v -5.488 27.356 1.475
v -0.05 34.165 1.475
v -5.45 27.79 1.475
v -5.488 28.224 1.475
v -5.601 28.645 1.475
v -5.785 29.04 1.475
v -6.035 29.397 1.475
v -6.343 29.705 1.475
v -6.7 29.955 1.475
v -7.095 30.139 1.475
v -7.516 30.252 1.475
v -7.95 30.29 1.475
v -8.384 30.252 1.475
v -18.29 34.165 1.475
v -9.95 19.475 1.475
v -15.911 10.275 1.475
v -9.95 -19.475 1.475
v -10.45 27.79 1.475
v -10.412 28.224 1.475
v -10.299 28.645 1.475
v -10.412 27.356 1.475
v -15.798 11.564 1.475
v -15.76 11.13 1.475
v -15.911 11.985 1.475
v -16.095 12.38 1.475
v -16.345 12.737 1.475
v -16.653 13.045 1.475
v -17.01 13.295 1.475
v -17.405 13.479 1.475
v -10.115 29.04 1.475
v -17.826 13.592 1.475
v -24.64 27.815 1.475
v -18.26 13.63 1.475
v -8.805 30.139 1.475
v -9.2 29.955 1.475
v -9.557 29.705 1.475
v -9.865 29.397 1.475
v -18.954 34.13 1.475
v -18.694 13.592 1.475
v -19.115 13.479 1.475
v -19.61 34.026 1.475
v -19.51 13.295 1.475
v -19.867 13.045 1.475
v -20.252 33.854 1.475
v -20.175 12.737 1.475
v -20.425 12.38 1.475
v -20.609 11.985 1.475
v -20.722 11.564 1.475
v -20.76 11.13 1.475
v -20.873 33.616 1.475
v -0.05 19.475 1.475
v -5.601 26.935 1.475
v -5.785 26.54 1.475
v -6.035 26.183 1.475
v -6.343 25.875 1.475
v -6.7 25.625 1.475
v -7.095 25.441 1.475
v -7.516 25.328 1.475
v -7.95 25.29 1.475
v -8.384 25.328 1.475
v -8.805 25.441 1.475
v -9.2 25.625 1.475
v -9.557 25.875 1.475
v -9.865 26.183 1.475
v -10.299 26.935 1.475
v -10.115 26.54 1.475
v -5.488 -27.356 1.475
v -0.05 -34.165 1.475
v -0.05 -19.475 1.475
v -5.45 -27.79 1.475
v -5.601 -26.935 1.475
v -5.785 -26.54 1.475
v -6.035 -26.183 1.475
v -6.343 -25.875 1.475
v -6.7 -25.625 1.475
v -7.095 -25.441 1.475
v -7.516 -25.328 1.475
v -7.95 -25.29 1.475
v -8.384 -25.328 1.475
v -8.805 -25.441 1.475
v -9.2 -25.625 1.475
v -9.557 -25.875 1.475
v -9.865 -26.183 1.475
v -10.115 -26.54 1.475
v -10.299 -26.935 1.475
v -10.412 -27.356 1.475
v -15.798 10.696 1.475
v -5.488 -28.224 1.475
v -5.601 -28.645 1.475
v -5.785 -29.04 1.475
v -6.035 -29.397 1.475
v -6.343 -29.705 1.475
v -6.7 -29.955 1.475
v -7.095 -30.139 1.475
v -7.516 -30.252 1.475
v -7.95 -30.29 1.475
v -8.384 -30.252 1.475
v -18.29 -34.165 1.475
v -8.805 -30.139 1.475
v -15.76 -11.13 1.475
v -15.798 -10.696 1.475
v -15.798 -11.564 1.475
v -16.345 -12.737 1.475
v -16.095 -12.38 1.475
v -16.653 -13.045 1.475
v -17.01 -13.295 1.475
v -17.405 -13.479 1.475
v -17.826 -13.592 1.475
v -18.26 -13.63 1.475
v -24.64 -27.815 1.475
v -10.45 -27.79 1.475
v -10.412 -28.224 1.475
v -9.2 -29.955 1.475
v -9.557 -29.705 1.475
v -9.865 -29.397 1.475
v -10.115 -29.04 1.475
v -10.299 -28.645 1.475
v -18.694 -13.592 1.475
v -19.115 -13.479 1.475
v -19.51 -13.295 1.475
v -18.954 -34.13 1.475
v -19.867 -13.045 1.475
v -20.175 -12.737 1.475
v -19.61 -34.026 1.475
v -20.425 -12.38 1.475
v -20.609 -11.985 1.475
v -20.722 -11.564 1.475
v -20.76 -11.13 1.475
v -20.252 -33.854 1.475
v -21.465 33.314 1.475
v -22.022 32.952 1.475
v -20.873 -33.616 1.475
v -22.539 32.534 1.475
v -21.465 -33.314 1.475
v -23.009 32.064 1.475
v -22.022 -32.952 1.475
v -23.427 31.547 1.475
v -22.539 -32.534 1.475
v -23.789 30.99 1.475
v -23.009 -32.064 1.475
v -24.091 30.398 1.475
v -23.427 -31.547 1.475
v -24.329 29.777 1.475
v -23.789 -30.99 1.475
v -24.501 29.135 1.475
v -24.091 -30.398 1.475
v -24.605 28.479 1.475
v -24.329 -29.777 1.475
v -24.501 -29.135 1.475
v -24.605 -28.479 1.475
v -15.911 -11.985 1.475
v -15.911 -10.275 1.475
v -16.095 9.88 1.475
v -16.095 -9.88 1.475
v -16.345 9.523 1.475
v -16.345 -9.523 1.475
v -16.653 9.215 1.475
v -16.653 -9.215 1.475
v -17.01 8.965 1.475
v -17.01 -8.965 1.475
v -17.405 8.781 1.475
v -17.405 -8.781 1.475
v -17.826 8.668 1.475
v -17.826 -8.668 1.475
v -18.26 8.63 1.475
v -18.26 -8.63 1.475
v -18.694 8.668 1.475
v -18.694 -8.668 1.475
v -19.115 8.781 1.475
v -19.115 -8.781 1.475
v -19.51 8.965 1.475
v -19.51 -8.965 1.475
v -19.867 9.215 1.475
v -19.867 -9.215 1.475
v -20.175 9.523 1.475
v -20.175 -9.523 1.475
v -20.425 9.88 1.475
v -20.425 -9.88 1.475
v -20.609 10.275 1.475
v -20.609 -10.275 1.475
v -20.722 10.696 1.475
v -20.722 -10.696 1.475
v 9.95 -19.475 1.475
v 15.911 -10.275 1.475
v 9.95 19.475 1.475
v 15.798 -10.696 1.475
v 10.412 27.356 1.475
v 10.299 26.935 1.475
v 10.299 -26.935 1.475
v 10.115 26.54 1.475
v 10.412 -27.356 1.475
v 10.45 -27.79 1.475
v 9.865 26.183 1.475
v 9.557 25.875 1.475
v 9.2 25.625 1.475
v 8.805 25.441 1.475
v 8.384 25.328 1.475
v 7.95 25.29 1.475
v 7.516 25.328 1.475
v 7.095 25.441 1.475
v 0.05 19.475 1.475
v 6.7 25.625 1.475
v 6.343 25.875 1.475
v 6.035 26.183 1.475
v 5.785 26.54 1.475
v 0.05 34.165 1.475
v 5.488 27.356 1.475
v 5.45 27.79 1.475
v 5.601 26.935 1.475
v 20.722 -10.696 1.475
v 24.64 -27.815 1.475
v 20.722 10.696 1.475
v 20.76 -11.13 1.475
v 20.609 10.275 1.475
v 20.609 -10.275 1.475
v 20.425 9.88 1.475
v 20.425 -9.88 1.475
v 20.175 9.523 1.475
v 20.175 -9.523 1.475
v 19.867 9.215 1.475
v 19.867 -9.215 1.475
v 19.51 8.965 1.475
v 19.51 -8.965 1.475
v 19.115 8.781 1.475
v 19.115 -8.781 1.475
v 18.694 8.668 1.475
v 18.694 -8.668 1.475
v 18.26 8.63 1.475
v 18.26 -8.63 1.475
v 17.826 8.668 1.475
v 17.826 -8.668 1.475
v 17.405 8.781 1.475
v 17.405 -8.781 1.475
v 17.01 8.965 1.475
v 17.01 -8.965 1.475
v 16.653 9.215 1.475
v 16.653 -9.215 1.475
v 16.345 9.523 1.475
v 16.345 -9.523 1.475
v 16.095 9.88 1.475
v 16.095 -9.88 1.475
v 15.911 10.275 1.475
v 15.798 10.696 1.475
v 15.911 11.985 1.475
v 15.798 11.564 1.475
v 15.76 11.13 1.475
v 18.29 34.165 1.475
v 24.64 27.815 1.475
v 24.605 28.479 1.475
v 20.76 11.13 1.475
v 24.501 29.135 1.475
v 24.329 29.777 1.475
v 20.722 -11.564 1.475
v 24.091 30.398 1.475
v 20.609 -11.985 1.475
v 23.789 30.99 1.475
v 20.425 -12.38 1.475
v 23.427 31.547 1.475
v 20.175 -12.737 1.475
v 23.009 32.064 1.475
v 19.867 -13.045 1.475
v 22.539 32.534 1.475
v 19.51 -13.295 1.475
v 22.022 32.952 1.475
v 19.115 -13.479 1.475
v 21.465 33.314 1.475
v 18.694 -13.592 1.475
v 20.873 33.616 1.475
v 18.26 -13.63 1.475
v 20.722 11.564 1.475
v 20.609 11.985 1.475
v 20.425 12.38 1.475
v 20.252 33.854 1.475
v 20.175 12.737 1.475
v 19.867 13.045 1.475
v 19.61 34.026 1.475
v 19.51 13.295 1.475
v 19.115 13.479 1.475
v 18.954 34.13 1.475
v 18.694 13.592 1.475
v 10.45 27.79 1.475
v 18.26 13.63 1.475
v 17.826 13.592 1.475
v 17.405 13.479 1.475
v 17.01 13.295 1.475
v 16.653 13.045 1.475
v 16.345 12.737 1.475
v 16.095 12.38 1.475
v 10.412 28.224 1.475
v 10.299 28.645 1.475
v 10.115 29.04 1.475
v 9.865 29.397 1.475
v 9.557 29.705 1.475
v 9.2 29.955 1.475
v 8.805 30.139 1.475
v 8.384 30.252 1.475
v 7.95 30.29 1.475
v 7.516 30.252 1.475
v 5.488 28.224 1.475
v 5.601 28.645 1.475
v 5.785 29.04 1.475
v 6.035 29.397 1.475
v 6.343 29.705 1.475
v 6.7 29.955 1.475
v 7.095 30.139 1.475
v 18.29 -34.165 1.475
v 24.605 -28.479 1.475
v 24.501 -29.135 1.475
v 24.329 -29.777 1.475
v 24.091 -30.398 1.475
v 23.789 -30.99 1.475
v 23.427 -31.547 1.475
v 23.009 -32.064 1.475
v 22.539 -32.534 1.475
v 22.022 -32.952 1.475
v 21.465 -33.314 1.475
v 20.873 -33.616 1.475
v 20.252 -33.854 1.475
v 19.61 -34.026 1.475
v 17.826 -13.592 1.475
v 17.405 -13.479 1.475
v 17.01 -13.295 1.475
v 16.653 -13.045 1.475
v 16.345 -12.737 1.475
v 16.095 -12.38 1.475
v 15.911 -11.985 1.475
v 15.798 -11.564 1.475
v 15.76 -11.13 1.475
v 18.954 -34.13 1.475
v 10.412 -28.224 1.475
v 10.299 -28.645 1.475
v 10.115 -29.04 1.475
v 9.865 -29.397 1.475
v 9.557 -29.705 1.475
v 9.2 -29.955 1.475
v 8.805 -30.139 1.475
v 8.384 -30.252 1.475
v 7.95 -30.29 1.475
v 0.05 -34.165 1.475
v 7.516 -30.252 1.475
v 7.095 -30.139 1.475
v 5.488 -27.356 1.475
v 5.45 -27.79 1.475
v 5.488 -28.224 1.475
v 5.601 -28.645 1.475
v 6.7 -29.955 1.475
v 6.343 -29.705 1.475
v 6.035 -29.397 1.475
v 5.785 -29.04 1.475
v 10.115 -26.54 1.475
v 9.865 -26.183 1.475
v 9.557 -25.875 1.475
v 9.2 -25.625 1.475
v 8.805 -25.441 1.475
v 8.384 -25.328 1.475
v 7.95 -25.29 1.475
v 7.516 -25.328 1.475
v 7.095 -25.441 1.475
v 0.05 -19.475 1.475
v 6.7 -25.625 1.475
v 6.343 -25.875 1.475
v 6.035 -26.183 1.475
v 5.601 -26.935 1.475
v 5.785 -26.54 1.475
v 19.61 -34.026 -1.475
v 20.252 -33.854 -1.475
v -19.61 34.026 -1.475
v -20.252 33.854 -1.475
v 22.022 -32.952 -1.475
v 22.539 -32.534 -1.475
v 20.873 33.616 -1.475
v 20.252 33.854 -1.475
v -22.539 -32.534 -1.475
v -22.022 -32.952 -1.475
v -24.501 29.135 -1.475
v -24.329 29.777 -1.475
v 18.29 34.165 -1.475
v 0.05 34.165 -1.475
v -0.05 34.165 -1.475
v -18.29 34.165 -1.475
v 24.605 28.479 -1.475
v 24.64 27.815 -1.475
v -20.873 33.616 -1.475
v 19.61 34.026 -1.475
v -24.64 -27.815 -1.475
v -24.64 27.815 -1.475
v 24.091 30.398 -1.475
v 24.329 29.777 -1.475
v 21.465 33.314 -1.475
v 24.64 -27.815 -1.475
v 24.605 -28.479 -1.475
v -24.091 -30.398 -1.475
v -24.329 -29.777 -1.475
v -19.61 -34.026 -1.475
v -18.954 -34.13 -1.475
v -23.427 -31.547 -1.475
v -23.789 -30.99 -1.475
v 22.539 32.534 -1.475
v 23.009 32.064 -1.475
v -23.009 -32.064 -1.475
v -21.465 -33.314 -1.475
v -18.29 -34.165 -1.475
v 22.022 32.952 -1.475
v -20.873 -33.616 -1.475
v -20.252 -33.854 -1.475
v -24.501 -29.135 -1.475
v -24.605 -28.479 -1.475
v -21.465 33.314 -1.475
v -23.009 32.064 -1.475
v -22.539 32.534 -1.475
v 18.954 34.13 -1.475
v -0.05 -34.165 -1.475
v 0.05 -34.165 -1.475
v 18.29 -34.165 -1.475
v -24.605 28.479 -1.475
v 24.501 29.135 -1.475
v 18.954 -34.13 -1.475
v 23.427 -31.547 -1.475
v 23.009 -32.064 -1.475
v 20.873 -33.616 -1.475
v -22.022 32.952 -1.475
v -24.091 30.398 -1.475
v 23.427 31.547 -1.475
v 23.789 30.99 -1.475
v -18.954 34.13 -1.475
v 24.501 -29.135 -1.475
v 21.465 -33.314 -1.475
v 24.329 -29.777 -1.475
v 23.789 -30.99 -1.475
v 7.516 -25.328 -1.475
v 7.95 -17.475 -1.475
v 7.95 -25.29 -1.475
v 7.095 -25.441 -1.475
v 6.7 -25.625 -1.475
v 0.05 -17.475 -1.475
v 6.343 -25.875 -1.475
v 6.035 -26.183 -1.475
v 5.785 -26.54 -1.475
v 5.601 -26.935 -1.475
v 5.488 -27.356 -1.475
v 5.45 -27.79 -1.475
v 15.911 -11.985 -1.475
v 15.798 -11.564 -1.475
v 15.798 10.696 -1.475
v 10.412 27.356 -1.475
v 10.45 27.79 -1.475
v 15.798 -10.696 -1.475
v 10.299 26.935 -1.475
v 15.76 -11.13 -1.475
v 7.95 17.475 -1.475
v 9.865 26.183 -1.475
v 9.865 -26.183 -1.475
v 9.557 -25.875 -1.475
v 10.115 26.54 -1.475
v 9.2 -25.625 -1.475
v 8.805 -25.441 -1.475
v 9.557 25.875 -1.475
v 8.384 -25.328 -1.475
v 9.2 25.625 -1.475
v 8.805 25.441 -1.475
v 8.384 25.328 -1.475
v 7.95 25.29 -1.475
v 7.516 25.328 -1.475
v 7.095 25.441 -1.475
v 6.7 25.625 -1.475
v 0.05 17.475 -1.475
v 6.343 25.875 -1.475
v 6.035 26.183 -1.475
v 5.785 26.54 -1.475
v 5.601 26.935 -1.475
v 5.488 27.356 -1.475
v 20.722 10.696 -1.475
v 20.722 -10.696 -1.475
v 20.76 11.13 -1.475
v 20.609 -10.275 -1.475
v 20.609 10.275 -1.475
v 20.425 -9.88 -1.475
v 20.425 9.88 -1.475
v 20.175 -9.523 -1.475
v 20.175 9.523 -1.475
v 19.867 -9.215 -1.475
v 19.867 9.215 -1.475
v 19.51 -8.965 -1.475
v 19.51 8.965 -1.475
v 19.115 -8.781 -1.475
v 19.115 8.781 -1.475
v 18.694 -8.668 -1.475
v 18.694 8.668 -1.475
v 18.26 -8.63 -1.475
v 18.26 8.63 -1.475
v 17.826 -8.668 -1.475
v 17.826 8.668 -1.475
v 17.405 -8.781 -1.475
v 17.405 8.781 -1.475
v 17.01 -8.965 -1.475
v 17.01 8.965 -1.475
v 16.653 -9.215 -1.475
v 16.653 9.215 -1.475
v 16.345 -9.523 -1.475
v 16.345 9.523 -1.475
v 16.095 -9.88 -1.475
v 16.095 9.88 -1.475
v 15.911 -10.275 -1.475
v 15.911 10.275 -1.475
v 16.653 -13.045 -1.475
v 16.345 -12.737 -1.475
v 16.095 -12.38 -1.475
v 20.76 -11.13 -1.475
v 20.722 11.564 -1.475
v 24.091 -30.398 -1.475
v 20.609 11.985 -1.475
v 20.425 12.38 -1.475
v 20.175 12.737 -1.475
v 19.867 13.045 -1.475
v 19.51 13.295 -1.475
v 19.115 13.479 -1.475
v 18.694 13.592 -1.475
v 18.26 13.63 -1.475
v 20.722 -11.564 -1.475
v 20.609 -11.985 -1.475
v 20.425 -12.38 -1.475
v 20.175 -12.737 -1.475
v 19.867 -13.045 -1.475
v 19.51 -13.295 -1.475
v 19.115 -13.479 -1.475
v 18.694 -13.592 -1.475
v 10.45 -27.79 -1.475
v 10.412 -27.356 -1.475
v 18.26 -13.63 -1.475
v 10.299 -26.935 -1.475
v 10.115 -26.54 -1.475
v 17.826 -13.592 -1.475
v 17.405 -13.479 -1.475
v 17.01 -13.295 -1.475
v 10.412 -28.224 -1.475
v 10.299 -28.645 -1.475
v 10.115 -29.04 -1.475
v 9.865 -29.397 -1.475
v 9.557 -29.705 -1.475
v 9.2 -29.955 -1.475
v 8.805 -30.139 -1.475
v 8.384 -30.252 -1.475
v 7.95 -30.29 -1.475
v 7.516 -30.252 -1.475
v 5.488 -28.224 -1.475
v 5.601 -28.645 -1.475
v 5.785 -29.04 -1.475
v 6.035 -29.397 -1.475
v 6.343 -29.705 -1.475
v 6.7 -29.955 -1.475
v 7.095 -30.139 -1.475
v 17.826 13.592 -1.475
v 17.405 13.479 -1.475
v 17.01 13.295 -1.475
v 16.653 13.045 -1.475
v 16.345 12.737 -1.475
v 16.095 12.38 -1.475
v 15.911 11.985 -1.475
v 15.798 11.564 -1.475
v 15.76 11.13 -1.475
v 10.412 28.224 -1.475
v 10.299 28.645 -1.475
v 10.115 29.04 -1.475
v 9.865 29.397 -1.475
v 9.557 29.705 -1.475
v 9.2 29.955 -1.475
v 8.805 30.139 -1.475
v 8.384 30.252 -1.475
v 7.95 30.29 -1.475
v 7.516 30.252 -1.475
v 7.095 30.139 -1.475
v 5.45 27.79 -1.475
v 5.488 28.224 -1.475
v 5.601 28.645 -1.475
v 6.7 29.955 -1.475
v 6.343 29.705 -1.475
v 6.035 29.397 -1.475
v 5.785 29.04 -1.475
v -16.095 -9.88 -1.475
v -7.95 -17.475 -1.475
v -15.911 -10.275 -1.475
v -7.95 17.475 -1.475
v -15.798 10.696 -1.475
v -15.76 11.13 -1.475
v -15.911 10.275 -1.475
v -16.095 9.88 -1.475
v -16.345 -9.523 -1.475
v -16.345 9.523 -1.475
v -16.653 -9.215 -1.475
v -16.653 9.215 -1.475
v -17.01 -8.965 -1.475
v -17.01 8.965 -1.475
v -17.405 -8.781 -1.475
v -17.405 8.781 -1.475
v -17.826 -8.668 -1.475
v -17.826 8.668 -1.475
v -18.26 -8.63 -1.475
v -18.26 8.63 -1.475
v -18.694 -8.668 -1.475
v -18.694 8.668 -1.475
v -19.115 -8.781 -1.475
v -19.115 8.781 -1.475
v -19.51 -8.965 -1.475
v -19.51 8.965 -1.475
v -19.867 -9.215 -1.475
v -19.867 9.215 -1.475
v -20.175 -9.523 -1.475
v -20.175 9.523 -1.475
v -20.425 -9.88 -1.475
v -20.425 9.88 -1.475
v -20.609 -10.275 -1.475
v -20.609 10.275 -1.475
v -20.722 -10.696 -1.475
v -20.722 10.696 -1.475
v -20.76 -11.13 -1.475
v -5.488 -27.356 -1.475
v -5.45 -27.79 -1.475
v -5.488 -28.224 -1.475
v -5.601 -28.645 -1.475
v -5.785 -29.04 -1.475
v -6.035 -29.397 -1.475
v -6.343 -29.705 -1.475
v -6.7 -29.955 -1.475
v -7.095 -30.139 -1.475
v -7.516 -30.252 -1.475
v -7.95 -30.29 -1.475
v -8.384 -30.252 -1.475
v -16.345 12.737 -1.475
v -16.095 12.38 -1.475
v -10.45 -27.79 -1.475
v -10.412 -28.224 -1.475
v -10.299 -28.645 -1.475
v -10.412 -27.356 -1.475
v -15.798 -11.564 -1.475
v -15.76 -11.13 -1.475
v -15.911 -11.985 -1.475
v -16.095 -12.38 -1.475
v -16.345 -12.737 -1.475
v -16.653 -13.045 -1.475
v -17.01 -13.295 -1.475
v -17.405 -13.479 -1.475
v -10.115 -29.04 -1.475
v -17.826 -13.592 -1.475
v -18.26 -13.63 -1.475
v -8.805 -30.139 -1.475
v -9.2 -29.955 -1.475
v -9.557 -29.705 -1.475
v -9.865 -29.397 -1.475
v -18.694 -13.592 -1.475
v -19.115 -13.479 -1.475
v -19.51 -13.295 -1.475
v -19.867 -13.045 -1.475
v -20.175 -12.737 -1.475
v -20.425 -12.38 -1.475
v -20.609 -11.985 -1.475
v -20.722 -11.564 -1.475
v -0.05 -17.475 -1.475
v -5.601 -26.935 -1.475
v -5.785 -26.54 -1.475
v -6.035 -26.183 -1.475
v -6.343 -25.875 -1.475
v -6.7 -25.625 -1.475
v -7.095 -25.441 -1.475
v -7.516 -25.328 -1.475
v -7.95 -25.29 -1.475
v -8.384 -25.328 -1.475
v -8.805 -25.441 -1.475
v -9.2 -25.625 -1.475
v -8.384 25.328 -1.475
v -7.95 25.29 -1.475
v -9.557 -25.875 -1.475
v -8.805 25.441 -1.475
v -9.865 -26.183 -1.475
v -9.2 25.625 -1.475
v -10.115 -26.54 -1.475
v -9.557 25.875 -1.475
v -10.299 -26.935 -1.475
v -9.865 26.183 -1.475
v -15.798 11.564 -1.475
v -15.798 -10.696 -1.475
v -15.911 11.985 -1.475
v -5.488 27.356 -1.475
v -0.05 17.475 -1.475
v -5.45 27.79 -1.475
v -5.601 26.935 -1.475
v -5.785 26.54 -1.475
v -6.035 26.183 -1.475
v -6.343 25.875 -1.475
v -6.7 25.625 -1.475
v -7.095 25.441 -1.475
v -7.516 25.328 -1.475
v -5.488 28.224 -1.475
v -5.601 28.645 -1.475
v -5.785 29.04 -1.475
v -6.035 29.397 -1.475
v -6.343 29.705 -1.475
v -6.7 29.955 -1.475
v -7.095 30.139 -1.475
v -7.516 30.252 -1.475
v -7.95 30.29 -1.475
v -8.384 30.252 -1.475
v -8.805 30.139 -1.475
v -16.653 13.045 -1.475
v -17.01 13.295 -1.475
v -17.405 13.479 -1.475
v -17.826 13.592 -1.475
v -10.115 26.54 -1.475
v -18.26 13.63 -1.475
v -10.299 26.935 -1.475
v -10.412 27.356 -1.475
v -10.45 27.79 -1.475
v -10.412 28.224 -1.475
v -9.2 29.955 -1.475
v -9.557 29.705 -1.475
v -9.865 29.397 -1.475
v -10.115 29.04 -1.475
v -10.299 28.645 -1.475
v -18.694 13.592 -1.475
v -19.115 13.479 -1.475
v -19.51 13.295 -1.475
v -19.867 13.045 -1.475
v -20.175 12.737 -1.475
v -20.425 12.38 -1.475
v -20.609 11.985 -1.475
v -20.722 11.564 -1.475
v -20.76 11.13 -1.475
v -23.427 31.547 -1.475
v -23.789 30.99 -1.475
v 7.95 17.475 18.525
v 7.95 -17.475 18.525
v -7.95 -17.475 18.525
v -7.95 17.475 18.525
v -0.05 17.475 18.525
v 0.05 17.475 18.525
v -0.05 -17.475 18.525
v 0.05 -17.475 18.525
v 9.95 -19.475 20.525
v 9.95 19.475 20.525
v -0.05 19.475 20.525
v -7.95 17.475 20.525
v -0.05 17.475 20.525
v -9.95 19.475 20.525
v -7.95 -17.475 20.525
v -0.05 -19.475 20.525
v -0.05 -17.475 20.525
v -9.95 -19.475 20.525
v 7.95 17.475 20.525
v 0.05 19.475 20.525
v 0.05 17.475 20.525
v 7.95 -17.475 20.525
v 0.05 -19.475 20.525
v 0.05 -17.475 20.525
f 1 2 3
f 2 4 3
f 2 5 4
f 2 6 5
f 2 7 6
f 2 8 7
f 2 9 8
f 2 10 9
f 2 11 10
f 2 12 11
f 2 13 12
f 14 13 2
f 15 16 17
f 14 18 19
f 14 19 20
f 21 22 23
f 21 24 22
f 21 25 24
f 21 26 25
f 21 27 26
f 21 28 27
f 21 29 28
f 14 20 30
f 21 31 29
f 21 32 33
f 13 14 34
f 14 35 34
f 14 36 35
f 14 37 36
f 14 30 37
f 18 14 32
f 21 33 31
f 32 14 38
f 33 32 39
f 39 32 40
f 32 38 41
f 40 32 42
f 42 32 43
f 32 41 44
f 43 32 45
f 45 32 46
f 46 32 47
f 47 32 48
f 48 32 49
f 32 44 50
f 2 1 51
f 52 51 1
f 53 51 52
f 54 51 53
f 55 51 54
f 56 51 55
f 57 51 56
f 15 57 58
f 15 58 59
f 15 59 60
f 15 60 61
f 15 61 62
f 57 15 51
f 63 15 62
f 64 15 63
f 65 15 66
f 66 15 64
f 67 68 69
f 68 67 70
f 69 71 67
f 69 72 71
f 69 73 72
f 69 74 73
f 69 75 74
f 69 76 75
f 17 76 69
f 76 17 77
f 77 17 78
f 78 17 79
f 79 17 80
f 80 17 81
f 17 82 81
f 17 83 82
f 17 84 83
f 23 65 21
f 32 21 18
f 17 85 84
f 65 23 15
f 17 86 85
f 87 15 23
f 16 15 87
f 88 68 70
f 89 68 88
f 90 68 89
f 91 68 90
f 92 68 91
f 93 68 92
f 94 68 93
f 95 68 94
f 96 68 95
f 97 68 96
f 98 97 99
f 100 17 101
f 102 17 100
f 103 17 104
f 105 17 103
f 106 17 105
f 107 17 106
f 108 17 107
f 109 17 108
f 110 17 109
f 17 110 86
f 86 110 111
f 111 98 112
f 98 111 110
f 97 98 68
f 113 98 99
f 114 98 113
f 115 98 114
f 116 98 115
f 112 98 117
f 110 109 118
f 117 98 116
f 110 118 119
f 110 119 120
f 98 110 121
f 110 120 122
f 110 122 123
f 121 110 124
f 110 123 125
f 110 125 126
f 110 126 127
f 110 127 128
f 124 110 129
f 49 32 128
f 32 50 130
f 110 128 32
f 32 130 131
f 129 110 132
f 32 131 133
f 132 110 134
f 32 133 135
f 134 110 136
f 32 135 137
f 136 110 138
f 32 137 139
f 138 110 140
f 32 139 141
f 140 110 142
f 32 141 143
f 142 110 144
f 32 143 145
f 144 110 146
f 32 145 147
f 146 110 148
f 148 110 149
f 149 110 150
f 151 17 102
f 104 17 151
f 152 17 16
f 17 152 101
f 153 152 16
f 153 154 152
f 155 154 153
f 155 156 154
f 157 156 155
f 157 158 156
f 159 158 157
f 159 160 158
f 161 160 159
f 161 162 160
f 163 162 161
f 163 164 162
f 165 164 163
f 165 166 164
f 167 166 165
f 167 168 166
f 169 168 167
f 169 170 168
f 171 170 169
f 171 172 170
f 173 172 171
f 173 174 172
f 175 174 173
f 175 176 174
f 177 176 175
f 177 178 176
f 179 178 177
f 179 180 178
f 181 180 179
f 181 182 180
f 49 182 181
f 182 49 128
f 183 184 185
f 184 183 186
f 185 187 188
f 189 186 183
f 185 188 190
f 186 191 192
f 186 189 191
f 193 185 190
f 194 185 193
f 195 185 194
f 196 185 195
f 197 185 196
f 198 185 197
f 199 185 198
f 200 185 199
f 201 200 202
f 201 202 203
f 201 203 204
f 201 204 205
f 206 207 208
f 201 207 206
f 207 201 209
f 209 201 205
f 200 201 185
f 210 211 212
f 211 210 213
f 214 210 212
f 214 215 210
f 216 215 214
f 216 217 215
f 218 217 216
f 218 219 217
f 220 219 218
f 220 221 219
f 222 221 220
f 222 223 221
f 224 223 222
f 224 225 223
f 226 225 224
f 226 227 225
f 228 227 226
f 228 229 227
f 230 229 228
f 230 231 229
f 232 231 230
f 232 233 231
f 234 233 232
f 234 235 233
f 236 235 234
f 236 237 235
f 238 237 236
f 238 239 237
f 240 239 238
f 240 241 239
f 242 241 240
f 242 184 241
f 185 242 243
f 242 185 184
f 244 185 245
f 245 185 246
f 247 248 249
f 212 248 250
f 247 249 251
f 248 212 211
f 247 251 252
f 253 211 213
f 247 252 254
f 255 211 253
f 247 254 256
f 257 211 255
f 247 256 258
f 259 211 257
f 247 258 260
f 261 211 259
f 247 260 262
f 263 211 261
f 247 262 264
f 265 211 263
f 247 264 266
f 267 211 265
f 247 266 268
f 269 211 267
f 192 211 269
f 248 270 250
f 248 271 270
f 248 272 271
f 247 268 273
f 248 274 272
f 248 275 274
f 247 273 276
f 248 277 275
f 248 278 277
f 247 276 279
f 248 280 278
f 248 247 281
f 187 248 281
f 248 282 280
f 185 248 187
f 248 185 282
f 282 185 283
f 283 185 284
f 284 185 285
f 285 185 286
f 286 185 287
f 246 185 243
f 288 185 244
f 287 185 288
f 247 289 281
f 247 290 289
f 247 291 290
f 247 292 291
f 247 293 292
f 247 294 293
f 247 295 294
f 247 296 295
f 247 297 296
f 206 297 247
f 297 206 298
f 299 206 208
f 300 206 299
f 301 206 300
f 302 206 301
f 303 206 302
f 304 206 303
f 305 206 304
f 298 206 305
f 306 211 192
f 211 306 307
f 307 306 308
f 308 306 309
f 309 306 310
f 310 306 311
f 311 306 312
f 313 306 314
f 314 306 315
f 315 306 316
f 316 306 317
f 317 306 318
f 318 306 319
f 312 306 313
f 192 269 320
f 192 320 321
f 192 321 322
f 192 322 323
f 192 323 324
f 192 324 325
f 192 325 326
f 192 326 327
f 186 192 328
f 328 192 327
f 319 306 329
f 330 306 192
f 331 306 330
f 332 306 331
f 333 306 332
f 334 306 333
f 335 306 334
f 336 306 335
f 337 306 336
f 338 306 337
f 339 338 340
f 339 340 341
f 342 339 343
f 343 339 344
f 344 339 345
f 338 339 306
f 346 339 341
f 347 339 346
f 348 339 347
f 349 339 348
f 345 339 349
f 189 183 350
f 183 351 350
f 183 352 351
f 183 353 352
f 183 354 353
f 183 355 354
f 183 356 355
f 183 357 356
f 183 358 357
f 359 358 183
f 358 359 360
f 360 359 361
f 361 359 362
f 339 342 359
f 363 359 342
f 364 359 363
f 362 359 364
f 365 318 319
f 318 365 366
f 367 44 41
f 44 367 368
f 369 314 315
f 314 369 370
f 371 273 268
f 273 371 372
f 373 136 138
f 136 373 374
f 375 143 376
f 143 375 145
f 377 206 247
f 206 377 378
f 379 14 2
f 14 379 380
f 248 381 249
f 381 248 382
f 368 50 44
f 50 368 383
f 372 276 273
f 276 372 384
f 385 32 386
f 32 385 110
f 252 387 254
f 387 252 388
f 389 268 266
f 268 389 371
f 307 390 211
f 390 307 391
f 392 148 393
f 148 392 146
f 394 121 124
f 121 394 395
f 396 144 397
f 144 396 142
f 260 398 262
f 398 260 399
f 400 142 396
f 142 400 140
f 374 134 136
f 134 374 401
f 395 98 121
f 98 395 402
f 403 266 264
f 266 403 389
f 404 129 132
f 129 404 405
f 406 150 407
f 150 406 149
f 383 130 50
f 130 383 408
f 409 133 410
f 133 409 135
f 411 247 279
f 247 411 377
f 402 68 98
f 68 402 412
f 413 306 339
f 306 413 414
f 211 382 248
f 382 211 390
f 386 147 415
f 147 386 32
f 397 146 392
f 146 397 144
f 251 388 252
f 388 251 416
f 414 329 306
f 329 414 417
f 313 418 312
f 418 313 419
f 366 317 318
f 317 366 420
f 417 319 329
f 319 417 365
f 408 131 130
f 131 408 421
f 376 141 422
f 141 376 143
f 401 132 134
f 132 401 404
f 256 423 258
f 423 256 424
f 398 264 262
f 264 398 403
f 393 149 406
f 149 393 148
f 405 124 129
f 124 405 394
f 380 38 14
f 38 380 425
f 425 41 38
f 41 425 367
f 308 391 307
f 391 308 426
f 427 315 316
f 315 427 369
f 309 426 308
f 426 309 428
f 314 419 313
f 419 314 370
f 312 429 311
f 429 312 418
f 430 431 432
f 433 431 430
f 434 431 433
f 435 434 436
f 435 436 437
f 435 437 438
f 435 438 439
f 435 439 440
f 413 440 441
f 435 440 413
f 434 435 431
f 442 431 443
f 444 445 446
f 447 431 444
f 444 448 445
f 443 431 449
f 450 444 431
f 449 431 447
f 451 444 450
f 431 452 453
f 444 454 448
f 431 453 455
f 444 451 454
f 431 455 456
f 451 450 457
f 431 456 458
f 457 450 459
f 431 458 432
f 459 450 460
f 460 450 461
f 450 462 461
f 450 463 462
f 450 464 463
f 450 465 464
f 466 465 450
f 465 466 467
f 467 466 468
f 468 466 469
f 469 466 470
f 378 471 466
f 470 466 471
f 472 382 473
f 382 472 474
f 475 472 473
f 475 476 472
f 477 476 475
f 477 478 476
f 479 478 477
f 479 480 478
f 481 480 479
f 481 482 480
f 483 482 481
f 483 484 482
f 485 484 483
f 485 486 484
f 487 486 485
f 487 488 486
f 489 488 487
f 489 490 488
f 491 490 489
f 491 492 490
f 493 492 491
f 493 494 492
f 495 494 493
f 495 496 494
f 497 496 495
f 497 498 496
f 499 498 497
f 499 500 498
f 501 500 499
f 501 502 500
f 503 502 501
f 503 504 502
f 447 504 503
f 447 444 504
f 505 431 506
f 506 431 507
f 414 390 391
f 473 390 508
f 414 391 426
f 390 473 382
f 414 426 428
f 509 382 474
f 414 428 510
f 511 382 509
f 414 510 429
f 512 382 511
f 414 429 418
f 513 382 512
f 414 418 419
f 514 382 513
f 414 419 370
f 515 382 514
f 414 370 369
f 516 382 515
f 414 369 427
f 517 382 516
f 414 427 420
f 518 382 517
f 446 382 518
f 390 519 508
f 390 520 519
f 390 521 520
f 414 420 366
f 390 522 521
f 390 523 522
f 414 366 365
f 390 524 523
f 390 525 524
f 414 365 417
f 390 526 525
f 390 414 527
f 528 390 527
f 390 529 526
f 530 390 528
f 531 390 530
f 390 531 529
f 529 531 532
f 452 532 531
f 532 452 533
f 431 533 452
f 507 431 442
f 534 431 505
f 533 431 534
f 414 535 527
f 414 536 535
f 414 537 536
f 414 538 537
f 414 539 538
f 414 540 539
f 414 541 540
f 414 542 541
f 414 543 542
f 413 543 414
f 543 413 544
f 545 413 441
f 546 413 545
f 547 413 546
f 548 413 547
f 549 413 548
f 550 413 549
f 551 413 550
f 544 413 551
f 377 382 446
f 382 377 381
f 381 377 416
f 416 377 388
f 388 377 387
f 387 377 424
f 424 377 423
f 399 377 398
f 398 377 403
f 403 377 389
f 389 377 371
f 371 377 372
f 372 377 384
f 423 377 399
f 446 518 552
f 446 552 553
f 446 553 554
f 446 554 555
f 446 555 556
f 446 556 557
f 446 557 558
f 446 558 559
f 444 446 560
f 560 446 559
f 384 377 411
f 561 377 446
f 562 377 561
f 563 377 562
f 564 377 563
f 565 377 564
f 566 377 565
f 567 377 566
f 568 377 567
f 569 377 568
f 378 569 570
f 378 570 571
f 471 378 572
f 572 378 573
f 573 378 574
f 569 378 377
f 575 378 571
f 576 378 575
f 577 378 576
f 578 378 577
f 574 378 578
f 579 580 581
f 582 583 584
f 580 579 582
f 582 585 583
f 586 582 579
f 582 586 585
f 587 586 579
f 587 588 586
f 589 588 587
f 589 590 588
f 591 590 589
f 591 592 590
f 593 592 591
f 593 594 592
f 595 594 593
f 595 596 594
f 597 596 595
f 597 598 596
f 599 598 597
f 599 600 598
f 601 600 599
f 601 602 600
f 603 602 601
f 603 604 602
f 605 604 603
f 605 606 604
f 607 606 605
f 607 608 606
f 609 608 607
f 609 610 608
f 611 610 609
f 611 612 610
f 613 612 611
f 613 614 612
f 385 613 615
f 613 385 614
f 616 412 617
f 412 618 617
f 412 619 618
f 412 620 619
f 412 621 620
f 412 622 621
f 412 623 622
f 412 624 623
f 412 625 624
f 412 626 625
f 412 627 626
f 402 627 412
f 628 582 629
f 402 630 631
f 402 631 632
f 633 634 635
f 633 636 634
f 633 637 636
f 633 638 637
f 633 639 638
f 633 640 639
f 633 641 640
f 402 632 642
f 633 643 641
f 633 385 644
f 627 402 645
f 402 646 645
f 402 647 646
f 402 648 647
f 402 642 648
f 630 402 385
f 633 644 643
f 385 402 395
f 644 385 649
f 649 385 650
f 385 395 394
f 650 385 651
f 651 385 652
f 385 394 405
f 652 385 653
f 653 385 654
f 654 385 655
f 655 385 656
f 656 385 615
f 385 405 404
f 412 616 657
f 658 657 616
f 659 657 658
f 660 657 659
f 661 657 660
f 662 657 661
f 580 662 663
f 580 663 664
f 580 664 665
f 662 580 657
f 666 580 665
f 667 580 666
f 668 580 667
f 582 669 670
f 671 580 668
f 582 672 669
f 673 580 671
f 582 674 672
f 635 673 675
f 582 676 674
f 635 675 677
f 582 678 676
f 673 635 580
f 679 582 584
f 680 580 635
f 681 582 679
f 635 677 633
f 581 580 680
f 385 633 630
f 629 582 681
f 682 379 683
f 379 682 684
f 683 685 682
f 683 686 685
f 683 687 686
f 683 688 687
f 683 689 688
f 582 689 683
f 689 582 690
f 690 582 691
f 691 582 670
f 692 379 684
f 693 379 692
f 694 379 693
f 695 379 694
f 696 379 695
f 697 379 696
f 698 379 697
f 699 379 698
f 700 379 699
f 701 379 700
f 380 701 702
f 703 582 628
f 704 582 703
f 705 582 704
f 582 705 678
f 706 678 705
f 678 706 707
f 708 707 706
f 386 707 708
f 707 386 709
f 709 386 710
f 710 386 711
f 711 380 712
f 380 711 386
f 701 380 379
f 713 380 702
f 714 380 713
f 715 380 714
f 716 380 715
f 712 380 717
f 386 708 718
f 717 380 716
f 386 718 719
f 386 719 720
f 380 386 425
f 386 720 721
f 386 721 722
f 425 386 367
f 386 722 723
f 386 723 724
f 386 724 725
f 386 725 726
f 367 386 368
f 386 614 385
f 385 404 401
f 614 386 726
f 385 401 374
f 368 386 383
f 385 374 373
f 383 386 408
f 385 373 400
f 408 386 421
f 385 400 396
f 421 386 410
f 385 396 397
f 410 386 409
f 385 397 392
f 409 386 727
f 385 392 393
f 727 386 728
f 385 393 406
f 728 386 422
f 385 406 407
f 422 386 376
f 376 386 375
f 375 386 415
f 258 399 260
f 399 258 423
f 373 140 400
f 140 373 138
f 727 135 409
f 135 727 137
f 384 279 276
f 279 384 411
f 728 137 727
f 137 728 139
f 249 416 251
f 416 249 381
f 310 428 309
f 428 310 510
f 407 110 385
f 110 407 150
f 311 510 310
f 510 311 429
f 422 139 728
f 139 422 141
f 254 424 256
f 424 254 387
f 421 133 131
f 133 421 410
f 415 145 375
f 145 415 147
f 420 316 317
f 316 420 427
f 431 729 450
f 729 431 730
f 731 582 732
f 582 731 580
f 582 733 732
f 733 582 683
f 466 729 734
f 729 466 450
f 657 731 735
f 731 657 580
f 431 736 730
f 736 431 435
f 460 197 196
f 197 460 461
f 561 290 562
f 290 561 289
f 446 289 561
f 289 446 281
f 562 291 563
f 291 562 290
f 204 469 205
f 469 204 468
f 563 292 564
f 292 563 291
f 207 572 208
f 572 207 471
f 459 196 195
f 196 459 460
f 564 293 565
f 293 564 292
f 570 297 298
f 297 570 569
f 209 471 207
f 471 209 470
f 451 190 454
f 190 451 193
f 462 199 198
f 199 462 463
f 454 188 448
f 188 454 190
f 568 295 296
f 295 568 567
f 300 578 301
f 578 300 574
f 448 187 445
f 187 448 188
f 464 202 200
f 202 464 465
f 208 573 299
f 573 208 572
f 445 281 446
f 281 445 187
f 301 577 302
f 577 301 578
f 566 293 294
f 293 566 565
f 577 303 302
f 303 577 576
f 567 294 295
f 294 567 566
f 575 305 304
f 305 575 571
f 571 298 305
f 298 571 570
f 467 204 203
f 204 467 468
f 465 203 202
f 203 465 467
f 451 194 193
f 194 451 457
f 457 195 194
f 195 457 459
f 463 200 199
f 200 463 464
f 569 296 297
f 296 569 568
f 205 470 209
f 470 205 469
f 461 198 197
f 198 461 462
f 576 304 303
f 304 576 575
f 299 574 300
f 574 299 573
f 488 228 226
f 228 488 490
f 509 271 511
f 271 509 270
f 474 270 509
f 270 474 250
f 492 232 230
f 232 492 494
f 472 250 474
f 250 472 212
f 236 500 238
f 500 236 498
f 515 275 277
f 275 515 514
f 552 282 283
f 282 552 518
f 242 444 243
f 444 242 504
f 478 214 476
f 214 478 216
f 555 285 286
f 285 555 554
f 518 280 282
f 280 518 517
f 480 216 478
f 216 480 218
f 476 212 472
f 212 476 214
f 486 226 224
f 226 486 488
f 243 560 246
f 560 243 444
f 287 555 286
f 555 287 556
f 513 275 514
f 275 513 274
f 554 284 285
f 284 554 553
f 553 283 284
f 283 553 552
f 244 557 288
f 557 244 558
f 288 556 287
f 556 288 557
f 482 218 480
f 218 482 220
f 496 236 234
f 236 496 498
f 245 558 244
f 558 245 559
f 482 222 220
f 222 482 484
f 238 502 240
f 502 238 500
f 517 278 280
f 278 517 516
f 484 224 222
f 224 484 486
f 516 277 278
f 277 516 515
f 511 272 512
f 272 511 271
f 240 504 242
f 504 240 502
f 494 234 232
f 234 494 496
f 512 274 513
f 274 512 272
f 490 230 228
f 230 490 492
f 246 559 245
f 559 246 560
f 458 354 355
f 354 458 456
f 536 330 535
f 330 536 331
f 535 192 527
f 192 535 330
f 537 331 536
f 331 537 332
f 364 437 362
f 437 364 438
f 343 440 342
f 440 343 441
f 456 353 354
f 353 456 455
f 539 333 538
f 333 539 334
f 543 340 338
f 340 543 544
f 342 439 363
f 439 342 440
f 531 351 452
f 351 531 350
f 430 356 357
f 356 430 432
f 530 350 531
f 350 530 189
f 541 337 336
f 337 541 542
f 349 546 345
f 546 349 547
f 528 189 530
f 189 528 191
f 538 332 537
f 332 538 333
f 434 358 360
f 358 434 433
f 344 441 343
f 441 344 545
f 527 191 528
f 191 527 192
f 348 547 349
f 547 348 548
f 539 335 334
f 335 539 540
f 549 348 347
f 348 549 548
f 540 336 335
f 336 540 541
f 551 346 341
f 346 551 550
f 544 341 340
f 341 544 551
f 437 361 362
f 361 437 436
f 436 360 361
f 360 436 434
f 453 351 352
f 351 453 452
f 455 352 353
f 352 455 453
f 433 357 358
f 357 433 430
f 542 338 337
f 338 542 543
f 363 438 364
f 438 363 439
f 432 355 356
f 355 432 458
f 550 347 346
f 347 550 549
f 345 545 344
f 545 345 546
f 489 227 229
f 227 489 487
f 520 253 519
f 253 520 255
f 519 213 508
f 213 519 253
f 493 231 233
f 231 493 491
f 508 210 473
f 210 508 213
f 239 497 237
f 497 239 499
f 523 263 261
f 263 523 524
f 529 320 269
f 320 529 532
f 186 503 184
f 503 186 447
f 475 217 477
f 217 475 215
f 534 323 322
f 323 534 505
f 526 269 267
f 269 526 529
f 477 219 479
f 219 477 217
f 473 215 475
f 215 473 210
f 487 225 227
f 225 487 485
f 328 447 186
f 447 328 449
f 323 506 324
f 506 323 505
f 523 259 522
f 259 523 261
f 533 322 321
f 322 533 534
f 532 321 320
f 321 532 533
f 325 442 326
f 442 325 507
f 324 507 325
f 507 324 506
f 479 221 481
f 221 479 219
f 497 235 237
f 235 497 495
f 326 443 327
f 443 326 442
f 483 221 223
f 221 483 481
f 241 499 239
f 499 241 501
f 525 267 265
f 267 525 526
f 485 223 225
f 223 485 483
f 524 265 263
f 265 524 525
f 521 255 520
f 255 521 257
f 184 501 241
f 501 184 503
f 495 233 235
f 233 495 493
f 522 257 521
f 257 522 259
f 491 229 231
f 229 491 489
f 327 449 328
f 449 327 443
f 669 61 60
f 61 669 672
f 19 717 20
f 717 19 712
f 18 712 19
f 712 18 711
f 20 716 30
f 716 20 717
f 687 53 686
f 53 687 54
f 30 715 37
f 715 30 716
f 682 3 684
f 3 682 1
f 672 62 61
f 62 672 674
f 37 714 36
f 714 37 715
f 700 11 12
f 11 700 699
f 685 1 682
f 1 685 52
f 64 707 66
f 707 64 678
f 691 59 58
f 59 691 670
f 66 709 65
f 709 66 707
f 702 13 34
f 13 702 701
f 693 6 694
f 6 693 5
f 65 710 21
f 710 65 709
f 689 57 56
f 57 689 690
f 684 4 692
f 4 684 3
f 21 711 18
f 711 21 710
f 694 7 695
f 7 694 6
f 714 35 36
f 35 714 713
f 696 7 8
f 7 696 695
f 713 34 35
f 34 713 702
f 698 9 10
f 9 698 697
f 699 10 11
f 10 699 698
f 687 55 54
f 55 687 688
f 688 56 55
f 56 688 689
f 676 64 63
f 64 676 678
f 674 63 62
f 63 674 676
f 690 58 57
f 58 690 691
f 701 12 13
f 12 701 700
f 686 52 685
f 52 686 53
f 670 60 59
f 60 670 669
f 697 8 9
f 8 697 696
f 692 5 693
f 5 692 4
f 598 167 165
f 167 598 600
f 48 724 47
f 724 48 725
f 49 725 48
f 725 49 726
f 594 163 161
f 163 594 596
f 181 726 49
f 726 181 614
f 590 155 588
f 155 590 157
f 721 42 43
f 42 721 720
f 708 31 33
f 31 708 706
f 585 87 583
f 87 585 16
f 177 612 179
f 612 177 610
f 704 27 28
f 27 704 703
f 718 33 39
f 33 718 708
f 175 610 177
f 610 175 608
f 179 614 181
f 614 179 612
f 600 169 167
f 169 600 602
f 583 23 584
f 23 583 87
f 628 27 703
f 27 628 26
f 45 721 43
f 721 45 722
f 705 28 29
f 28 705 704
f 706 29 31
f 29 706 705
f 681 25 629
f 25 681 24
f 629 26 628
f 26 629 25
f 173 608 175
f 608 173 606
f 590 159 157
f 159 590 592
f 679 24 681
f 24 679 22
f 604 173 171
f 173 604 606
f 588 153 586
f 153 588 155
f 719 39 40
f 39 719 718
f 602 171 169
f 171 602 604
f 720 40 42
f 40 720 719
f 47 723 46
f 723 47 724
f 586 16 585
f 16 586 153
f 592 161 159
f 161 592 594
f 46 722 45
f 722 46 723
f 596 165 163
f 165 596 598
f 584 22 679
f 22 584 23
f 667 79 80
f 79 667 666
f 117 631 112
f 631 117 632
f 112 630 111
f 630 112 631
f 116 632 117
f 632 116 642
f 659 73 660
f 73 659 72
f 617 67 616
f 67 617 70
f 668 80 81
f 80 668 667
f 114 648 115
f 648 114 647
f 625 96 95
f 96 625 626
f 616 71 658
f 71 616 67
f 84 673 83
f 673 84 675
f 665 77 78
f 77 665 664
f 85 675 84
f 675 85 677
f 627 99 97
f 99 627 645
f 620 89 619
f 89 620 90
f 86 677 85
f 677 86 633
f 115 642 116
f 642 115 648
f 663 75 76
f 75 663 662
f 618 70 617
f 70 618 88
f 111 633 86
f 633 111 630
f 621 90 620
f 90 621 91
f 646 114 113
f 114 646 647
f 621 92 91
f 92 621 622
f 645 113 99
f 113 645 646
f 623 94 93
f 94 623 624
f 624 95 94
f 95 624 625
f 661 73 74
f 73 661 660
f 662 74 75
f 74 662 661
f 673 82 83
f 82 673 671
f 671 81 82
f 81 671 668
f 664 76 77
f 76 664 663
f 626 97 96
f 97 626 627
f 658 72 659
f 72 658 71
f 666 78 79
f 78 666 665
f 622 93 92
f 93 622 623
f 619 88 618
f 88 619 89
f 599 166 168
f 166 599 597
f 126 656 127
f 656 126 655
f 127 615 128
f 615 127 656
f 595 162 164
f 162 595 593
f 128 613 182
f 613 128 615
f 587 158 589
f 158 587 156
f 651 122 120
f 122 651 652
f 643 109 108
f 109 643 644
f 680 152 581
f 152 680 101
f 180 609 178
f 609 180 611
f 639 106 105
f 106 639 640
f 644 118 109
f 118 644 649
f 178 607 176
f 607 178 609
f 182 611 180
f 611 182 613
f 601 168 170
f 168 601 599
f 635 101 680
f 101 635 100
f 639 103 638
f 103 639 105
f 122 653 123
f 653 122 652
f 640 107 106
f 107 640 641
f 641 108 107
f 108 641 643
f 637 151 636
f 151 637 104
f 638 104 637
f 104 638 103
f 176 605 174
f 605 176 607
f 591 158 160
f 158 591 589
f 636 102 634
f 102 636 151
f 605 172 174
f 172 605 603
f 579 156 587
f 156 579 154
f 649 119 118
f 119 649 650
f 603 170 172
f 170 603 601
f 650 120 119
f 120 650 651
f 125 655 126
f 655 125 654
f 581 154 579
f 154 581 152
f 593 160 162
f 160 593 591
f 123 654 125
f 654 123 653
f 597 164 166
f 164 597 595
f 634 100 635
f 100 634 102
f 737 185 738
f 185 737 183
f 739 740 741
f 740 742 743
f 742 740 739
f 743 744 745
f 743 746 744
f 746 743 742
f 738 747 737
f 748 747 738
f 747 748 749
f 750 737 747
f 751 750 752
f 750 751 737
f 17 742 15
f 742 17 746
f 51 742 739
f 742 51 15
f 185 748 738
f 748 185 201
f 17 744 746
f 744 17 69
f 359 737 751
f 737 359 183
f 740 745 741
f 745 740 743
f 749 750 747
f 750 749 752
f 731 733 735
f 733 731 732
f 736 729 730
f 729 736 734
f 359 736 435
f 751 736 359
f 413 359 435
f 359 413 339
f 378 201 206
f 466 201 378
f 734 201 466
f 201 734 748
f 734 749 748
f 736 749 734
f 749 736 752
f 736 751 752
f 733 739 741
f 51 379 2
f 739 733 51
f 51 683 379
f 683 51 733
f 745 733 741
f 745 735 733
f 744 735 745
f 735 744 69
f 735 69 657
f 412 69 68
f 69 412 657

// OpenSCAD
// file: common.scad
/**********************************************************************
 * Common waveguide code                                              *
 * NOTE: Must be included AFTER setting waveguide parameters          *
 * Perhaps in the future it could be useful to allow passing in these *
 * parameters to the modules themselves, removing this requirement.   *
 **********************************************************************/

/* wrcode: Waveguide size selection
 *  0: N/A
 *  1: WR-430  1.72- 2.60 GHz
 *  2: WR-340  2.20- 3.30 GHz
 *  3: WR-284  2.60- 3.95 GHz
 *  4: WR-229  3.30- 4.90 GHz
 *  5: WR-187  3.95- 5.85 GHz
 *  6: WR-159  4.90- 7.05 GHz
 *  7: WR-137  5.85- 8.20 GHz
 *  8: WR-112  7.05-10.00 GHz
 *  9: WR-90   8.20-12.40 GHz
 * 10: WR-75  10.00-15.00 GHz
 * 11: WR-62  12.49-18.00 GHz
 * 12: WR-51  15.00-22.00 GHz
 * 13: WR-42  18.00-26.50 GHz
 * 14: WR-34  22.00-33.00 GHz
 * 15: WR-28  26.50-40.00 GHz */

/*                     WR430   WR340  WR284   WR229  WR187  WR159  WR137  WR112   WR90   WR75   WR62   WR51   WR42   WR34  WR28 */
wrtab            = [0, 430,    340,   284,    229,   187,   159,   137,   112,    90,    75,    62,    51,    42,    34,   28   ]; /* Waveguide type */
/* Flange type:
 *  0: N/A
 *  1: Square flange
 *  2: Rectangular flange
 *  3: Circular flange
 * Note: For WR137 and larger, flange type and sizes are based off of default options from ATM Microwave
 * TODO: Allow selecting flange type manually */
fttab            = [0,   2,      2,     3,      2,     3,     2,     2,     1,     1,     1,     1,     1,     1,     1,    1   ];     /* Flange type */
/* Square flange */
sflange_sz       = [0,   0,      0,     0,      0,     0,     0,     0,    47.9,  41.4,  38.3,  33.3,  31.0,  22.41, 22.1, 19.05]*1.0; /* Flange size */
sflange_b_sp     = [0,   0,      0,     0,      0,     0,     0,     0,    18.72, 16.26, 14.25, 12.14, 11.25,  8.51,  7.9,  6.73]*1.0; /* Hole spacing short side */
sflange_a_sp     = [0,   0,      0,     0,      0,     0,     0,     0,    17.17, 15.49, 13.21, 12.63, 10.29,  8.13,  7.5,  6.34]*1.0; /* Hole spacing long side */
/* Rectangular flange */
rflange_a_sz     = [0, 161.04, 138.18,  0,     98.30,  0,    81.03, 68.33,  0,     0,     0,     0,     0,     0,     0,    0   ]*1.0; /* Flange size in A direction */
rflange_b_sz     = [0, 106.43,  95.25,  0,     69.85,  0,    61.98, 49.28,  0,     0,     0,     0,     0,     0,     0,    0   ]*1.0; /* Flange size in B direction */
rflange_a_a_off  = [0,  45.36,  34.14,  0,     27.18,  0,    12.70, 11.13,  0,     0,     0,     0,     0,     0,     0,    0   ]*1.0; /* A side screw offset from center in A direction */
rflange_a_b_off  = [0,  43.69,  38.10,  0,     26.67,  0,    22.23, 18.26,  0,     0,     0,     0,     0,     0,     0,    0   ]*1.0; /* A side screw offset from center in B direction */
rflange_b_a_off  = [0,  71.00,  59.54,  0,     41.15,  0,    32.33, 27.79,  0,     0,     0,     0,     0,     0,     0,    0   ]*1.0; /* B side screw offset from center in A direction */
rflange_b_b_off  = [0,  23.83,  17.04,  0,     12.70,  0,    10.10,  7.95,  0,     0,     0,     0,     0,     0,     0,    0   ]*1.0; /* B side screw offset from center in B direction */
rflange_hole_cnt = [0,  10,     10,     0,     10,     0,     6,     6,     0,     0,     0,     0,     0,     0,     0,    0   ]*1.0; /* Number of holes in flange */
/* Circular flange */
cflange_r        = [0,   0,      0,    67.44,   0,    45.97,  0,     0,     0,     0,     0,     0,     0,     0,     0,    0   ]*1.0; /* Circular flange radius */
cflange_hole_r   = [0,   0,      0,    60.33,   0,    41.28,  0,     0,     0,     0,     0,     0,     0,     0,     0,    0   ]*1.0; /* Circular flange screw placement radius */
cflange_hole_off = [0,   0,      0,    22.5,    0,     0,     0,     0,     0,     0,     0,     0,     0,     0,     0,    0   ]*1.0; /* Circular flange screw placement angle offset */


drilltab         = [0,   6.76,   6.76,  6.53,   6.50,  5.1,   6.5,   5.0,   4.3,   4.3,   4.1,   4.1,   4.1,   3.1,   3.1,  3.0 ]*1.0; /* Hole diameter */
/* Not all waveguide opening sizes correspong 100% to the waveguide number */
wgatab           = [0, 109.22,  86.36, 72.136, 58.17, 47.55, 40.39, 34.85, 28.50, 22.86, 19.05, 15.80, 12.95, 10.67,  8.64, 7.11]*1.0; /* Waveguide opening size A */
wgbtab           = [0,  54.61,  43.18, 34.036, 29.08, 22.15, 20.19, 15.80, 12.62, 10.16,  9.53,  7.90,  6.48,  4.32,  4.32, 3.56]*1.0; /* Waveguide opening size B */



wgsize_a = wgatab[wrcode] + (trim * 2);
wgsize_b = wgbtab[wrcode] + (trim * 2);

/* Faces for precision */
$fn=36;

/* Create a waveguide flange
 *   Heavily based on code from Rolf-Dieter Klein (www.rdklein.de)
 *   https://www.thingiverse.com/thing:161428
 */
module flange(wrid = wrcode, hole = true) {
    thickness = flanged - trim;

    flange_type   = fttab[wrid];
    flange_drill  = drilltab[wrid]/2.0;

    if(flange_type == 1) {
        /* Square flange */

        flange_size   = sflange_sz[wrid];
        flange_hole_s = sflange_b_sp[wrid];
        flange_hole_l = sflange_a_sp[wrid];

        difference() {
            difference() {
                intersection() {
                    cube([flange_size, flange_size, thickness], center=true);
                    rotate([0,0,45])
                        cube([flange_size*1.4142*0.9,flange_size*1.4142*0.9,thickness],center=true);
                }
                if(hole) {
                    cube([wgbtab[wrid] + (trim * 2), wgatab[wrid] + (trim * 2), flanged*2], center=true);
                }
            }
            /* Holes */
            translate([-flange_hole_s,  flange_hole_l, 0]) cylinder(h=thickness*1.1, r=flange_drill, center=true);
            translate([ flange_hole_s,  flange_hole_l, 0]) cylinder(h=thickness*1.1, r=flange_drill, center=true);
            translate([-flange_hole_s, -flange_hole_l, 0]) cylinder(h=thickness*1.1, r=flange_drill, center=true);
            translate([ flange_hole_s, -flange_hole_l, 0]) cylinder(h=thickness*1.1, r=flange_drill, center=true);
        }
    } else if(flange_type == 2) {
        /* Rectangular flange */

        flange_radius = 6.35;

        difference() {
            difference() {
                translate([0, 0, -(thickness/2)]) {
                    linear_extrude(height = thickness) {
                        offset(r = flange_radius, $fn=60) {
                            square([rflange_b_sz[wrid] - (flange_radius * 2), rflange_a_sz[wrid] - (flange_radius * 2)], center=true);
                        }
                    }
                }
                if(hole) {
                    cube([wgbtab[wrid] + (trim * 2), wgatab[wrid] + (trim * 2), flanged*2],center=true);
                }
            }

            for(m = [0:1]) {
                mirror([m,0,0]) {
                    for(n = [0:1]) {
                        mirror([0,n,0]) {
                            /* B side */
                            translate([rflange_b_b_off[wrid], rflange_b_a_off[wrid], 0]) {
                                cylinder(h=flanged*1.1, r=flange_drill, center=true);
                            }
                            /* A side */
                            translate([rflange_a_b_off[wrid], rflange_a_a_off[wrid], 0]) {
                                cylinder(h=flanged*1.1, r=flange_drill, center=true);
                            }
                            if(rflange_hole_cnt[wrid] >= 10) {
                                translate([rflange_a_b_off[wrid], 0, 0]) {
                                    cylinder(h=flanged*1.1, r=flange_drill, center=true);
                                }
                            }
                        }
                    }
                }
            }
        }
    } else if(flange_type == 3) {
        /* Circular flange */

        difference() {
            cylinder(h=thickness, r=cflange_r[wrid], center=true, $fn=120);
            if(hole) {
                cube([wgbtab[wrid] + (trim * 2), wgatab[wrid] + (trim * 2), flanged*2],center=true);
            }

            for(i = [0:7]) {
                rotate(cflange_hole_off[wrid] + i * 45, [0, 0, 1]) {
                    translate([cflange_hole_r[wrid], 0, 0]) {
                        cylinder(h=flanged*1.1, r=flange_drill, center=true);
                    }
                }
            }
        }
    }
}

/* Create a flangeless section of waveguide
 *   wg_len: Length of section, in mm
 */
module waveguide(wg_len, wrid=wrcode) {
    wgsize_a = wgatab[wrid] + (trim * 2);
    wgsize_b = wgbtab[wrid] + (trim * 2);

    translate([0,0,wg_len/2]) {
        difference() {
            cube([wgsize_b+wall*2, wgsize_a+wall*2, wg_len],          center=true);
            cube([wgsize_b,        wgsize_a,        wg_len + wall*.1],center=true);
        }
    }
}

/* Create a flangeless section of waveguide transition
 *   wg_len: Length of section, in mm
 *   wrid_1: Start waveguide ID
 *   wrid_2: End waveguide ID
 */
module waveguide_transition(wg_len, wrid_1, wrid_2) {
    wgsz_1_a = wgatab[wrid_1] + (trim * 2);
    wgsz_1_b = wgbtab[wrid_1] + (trim * 2);
    wgsz_2_a = wgatab[wrid_2] + (trim * 2);
    wgsz_2_b = wgbtab[wrid_2] + (trim * 2);

    difference() {
        polyhedron(
            points = [
                /* Waveguide A */
                [ wgsz_1_b/2 + wall,  wgsz_1_a/2 + wall, 0],
                [ wgsz_1_b/2 + wall, -wgsz_1_a/2 - wall, 0],
                [-wgsz_1_b/2 - wall, -wgsz_1_a/2 - wall, 0],
                [-wgsz_1_b/2 - wall,  wgsz_1_a/2 + wall, 0],
                /* Waveguide B */
                [ wgsz_2_b/2 + wall,  wgsz_2_a/2 + wall, wg_len],
                [ wgsz_2_b/2 + wall, -wgsz_2_a/2 - wall, wg_len],
                [-wgsz_2_b/2 - wall, -wgsz_2_a/2 - wall, wg_len],
                [-wgsz_2_b/2 - wall,  wgsz_2_a/2 + wall, wg_len]
            ],
            faces = [
                [0,1,4],[1,2,5],[2,3,6],[3,0,7],
                [1,5,4],[2,6,5],[3,7,6],[0,4,7],
                [1,0,3],[2,1,3],[4,5,7],[5,6,7]
            ]
        );
        polyhedron(
            points = [
                /* Waveguide A */
                [ wgsz_1_b/2,  wgsz_1_a/2, 0],
                [ wgsz_1_b/2, -wgsz_1_a/2, 0],
                [-wgsz_1_b/2, -wgsz_1_a/2, 0],
                [-wgsz_1_b/2,  wgsz_1_a/2, 0],
                /* Waveguide B */
                [ wgsz_2_b/2,  wgsz_2_a/2, wg_len],
                [ wgsz_2_b/2, -wgsz_2_a/2, wg_len],
                [-wgsz_2_b/2, -wgsz_2_a/2, wg_len],
                [-wgsz_2_b/2,  wgsz_2_a/2, wg_len]
            ],
            faces = [
                [0,1,4],[1,2,5],[2,3,6],[3,0,7],
                [1,5,4],[2,6,5],[3,7,6],[0,4,7],
                [1,0,3],[2,1,3],[4,5,7],[5,6,7]
            ]
        );
    }
}

module _curve(x_sz, y_sz, _rad, _angle, _rot=0, _dir=0) {
    translate([-_rad, , 0]) {
        rotate([90, _rot, 0]) {
            rotate_extrude(angle = _angle) {
                translate([_rad, 0, 0]) {
                    rotate([0, 0, _dir]) {
                        square([x_sz, y_sz], center = true);
                    }
                }
            }
        }
    }

}

/* Create a waveguide bend
 *   rg_rad: Radius of bend, at center of the waveguide cross-section
 *   wg_angle: Angle of bend
 */
module waveguide_bend(wg_rad, wg_angle, wrid=wrcode, dir=0) {
    wgsize_a = wgatab[wrid] + (trim * 2);
    wgsize_b = wgbtab[wrid] + (trim * 2);

    difference() {
        _curve(wgsize_b+wall*2, wgsize_a+wall*2, wg_rad, wg_angle, _dir=dir, $fn=300);
        _curve(wgsize_b,        wgsize_a,        wg_rad, wg_angle+0.02, 0.01, _dir=dir, $fn=300);
    }
}

module _twist(x_sz, y_sz, length, rotation) {
    linear_extrude(height=length, twist=rotation) {
        square([x_sz, y_sz], center = true);
    }
}

module waveguide_twist(wg_len, wg_rot, wrid=wrcode) {
    difference() {
        _twist(wgsize_b+wall*2, wgsize_a+wall*2, wg_len, wg_rot);
        _twist(wgsize_b,        wgsize_a,        wg_len, wg_rot);
    }
}

/* Generate horn antenna
 *   length:  Length of horn
 *   theta_h: Angle of horn in magnetic field
 *   theta_e: Angle of horn in electric field
 *
 * Polyhedron code loosely based off of code from Rolf-Dieter Klein (www.rdklein.de)
 *   https://www.thingiverse.com/thing:161428
 */
module horn(length, theta_h, theta_e, wrid=wrcode) {
    wgsize_a = wgatab[wrid] + (trim * 2);
    wgsize_b = wgbtab[wrid] + (trim * 2);

    /* Depth of horn that ends up inside waveguide */
    d_a = wgsize_a / (2 * tan(theta_h));
    d_b = wgsize_b / (2 * tan(theta_e));

    /* Size of horn opening */
    sz_a = wgsize_a + (2 * length * tan(theta_h));
    sz_b = wgsize_b + (2 * length * tan(theta_e));

    difference() {
        polyhedron(
            points = [
                /* Wide end */
                [ sz_b/2 + wall,  sz_a/2 + wall, length],
                [ sz_b/2 + wall, -sz_a/2 - wall, length],
                [-sz_b/2 - wall, -sz_a/2 - wall, length],
                [-sz_b/2 - wall,  sz_a/2 + wall, length],
                /* Small end */
                [ wgsize_b/2 + wall,  wgsize_a/2 + wall, 0],
                [ wgsize_b/2 + wall, -wgsize_a/2 - wall, 0],
                [-wgsize_b/2 - wall, -wgsize_a/2 - wall, 0],
                [-wgsize_b/2 - wall,  wgsize_a/2 + wall, 0]
            ],
            faces = [
                [0,1,4],[1,2,5],[2,3,6],[3,0,7],
                [1,5,4],[2,6,5],[3,7,6],[0,4,7],
                [1,0,3],[2,1,3],[4,5,7],[5,6,7]
            ]
        );
        polyhedron(
            points = [
                /* Wide end */
                [ sz_b/2,  sz_a/2, length],
                [ sz_b/2, -sz_a/2, length],
                [-sz_b/2, -sz_a/2, length],
                [-sz_b/2,  sz_a/2, length],
                /* Small end */
                [ wgsize_b/2,  wgsize_a/2, 0],
                [ wgsize_b/2, -wgsize_a/2, 0],
                [-wgsize_b/2, -wgsize_a/2, 0],
                [-wgsize_b/2,  wgsize_a/2, 0]
            ],
            faces = [
                [0,1,4],[1,2,5],[2,3,6],[3,0,7],
                [1,5,4],[2,6,5],[3,7,6],[0,4,7],
                [1,0,3],[2,1,3],[4,5,7],[5,6,7]
            ]
        );
    }
}

/* Generate an ideal horn antenna for a given wavelength
 *   l_h: Length of horn in magnetic field direction
 *   l_e: Length of horn in electric field direction
 *   wavelength: Design wavelength
 *
 * Both l_h and l_e include the portion of the antenna that would end up inside
 * the waveguide if both sides of the horn were extended until they meet.
 */
module ideal_horn(l_h, l_e, wavelength) {
    theta_e = asin(sqrt(2 * wavelength * l_e) / (2 * l_e));
    theta_h = asin(sqrt(3 * wavelength * l_h) / (2 * l_h));

    /* Not sure if min is good, but whatever. Maybe I should rewrite this to just produce the horn directly */
    length_e = (l_e * cos(theta_e)) - (wgsize_b / (2 * tan(theta_e)));
    length_h = (l_h * cos(theta_h)) - (wgsize_a / (2 * tan(theta_h)));
    echo("Len_E: ", length_e, "Len_H", length_h);
    length = min(length_e, length_h);

    horn(length, theta_h, theta_e);
}
// main file
/*****************************
 * Waveguide short generator *
 *****************************/

/********************
 * Variables/Inputs *
 ********************/

/* Waveguide selection */
wrcode = 7;

/* Waveguide wall thickness */
wall = 2;

/* Flange thickness */
flanged = 3;

/* Length of waveguide short, including flange, not including thickness of shorting wall.
 * Use 0 for a shorting plate. */
length = 20;

/* Amount to trim back internal and mating surfaces, for the purpose of accounting for metallic tape or coating. */
trim = 0.05;

/* Set to 1 to split waveguide along short side of section. This can make coating inside of waveguide much easier. */
split_part = 1;



/******************************************************************************/

/* Import waveguide components */
include <common.scad>

difference() {
    union() {
        if(length == 0) {
            /* No waveguide section needed */
            flange(hole = false);
        } else {
            flange();
            translate([0, 0, length - ((flanged - trim) / 2) + (wall / 2)]) {
                cube([wgbtab[wrcode] + (wall / 2), wgatab[wrcode] + (wall / 2), wall], center=true);
            }

            waveguide(length - ((flanged - trim) / 2) + wall);
        }
    }

    if(split_part) {
        translate([-trim, -wgsize_a*2, -flanged])
            cube([trim * 2, wgsize_a*4, length*1.5]);
    }
}
